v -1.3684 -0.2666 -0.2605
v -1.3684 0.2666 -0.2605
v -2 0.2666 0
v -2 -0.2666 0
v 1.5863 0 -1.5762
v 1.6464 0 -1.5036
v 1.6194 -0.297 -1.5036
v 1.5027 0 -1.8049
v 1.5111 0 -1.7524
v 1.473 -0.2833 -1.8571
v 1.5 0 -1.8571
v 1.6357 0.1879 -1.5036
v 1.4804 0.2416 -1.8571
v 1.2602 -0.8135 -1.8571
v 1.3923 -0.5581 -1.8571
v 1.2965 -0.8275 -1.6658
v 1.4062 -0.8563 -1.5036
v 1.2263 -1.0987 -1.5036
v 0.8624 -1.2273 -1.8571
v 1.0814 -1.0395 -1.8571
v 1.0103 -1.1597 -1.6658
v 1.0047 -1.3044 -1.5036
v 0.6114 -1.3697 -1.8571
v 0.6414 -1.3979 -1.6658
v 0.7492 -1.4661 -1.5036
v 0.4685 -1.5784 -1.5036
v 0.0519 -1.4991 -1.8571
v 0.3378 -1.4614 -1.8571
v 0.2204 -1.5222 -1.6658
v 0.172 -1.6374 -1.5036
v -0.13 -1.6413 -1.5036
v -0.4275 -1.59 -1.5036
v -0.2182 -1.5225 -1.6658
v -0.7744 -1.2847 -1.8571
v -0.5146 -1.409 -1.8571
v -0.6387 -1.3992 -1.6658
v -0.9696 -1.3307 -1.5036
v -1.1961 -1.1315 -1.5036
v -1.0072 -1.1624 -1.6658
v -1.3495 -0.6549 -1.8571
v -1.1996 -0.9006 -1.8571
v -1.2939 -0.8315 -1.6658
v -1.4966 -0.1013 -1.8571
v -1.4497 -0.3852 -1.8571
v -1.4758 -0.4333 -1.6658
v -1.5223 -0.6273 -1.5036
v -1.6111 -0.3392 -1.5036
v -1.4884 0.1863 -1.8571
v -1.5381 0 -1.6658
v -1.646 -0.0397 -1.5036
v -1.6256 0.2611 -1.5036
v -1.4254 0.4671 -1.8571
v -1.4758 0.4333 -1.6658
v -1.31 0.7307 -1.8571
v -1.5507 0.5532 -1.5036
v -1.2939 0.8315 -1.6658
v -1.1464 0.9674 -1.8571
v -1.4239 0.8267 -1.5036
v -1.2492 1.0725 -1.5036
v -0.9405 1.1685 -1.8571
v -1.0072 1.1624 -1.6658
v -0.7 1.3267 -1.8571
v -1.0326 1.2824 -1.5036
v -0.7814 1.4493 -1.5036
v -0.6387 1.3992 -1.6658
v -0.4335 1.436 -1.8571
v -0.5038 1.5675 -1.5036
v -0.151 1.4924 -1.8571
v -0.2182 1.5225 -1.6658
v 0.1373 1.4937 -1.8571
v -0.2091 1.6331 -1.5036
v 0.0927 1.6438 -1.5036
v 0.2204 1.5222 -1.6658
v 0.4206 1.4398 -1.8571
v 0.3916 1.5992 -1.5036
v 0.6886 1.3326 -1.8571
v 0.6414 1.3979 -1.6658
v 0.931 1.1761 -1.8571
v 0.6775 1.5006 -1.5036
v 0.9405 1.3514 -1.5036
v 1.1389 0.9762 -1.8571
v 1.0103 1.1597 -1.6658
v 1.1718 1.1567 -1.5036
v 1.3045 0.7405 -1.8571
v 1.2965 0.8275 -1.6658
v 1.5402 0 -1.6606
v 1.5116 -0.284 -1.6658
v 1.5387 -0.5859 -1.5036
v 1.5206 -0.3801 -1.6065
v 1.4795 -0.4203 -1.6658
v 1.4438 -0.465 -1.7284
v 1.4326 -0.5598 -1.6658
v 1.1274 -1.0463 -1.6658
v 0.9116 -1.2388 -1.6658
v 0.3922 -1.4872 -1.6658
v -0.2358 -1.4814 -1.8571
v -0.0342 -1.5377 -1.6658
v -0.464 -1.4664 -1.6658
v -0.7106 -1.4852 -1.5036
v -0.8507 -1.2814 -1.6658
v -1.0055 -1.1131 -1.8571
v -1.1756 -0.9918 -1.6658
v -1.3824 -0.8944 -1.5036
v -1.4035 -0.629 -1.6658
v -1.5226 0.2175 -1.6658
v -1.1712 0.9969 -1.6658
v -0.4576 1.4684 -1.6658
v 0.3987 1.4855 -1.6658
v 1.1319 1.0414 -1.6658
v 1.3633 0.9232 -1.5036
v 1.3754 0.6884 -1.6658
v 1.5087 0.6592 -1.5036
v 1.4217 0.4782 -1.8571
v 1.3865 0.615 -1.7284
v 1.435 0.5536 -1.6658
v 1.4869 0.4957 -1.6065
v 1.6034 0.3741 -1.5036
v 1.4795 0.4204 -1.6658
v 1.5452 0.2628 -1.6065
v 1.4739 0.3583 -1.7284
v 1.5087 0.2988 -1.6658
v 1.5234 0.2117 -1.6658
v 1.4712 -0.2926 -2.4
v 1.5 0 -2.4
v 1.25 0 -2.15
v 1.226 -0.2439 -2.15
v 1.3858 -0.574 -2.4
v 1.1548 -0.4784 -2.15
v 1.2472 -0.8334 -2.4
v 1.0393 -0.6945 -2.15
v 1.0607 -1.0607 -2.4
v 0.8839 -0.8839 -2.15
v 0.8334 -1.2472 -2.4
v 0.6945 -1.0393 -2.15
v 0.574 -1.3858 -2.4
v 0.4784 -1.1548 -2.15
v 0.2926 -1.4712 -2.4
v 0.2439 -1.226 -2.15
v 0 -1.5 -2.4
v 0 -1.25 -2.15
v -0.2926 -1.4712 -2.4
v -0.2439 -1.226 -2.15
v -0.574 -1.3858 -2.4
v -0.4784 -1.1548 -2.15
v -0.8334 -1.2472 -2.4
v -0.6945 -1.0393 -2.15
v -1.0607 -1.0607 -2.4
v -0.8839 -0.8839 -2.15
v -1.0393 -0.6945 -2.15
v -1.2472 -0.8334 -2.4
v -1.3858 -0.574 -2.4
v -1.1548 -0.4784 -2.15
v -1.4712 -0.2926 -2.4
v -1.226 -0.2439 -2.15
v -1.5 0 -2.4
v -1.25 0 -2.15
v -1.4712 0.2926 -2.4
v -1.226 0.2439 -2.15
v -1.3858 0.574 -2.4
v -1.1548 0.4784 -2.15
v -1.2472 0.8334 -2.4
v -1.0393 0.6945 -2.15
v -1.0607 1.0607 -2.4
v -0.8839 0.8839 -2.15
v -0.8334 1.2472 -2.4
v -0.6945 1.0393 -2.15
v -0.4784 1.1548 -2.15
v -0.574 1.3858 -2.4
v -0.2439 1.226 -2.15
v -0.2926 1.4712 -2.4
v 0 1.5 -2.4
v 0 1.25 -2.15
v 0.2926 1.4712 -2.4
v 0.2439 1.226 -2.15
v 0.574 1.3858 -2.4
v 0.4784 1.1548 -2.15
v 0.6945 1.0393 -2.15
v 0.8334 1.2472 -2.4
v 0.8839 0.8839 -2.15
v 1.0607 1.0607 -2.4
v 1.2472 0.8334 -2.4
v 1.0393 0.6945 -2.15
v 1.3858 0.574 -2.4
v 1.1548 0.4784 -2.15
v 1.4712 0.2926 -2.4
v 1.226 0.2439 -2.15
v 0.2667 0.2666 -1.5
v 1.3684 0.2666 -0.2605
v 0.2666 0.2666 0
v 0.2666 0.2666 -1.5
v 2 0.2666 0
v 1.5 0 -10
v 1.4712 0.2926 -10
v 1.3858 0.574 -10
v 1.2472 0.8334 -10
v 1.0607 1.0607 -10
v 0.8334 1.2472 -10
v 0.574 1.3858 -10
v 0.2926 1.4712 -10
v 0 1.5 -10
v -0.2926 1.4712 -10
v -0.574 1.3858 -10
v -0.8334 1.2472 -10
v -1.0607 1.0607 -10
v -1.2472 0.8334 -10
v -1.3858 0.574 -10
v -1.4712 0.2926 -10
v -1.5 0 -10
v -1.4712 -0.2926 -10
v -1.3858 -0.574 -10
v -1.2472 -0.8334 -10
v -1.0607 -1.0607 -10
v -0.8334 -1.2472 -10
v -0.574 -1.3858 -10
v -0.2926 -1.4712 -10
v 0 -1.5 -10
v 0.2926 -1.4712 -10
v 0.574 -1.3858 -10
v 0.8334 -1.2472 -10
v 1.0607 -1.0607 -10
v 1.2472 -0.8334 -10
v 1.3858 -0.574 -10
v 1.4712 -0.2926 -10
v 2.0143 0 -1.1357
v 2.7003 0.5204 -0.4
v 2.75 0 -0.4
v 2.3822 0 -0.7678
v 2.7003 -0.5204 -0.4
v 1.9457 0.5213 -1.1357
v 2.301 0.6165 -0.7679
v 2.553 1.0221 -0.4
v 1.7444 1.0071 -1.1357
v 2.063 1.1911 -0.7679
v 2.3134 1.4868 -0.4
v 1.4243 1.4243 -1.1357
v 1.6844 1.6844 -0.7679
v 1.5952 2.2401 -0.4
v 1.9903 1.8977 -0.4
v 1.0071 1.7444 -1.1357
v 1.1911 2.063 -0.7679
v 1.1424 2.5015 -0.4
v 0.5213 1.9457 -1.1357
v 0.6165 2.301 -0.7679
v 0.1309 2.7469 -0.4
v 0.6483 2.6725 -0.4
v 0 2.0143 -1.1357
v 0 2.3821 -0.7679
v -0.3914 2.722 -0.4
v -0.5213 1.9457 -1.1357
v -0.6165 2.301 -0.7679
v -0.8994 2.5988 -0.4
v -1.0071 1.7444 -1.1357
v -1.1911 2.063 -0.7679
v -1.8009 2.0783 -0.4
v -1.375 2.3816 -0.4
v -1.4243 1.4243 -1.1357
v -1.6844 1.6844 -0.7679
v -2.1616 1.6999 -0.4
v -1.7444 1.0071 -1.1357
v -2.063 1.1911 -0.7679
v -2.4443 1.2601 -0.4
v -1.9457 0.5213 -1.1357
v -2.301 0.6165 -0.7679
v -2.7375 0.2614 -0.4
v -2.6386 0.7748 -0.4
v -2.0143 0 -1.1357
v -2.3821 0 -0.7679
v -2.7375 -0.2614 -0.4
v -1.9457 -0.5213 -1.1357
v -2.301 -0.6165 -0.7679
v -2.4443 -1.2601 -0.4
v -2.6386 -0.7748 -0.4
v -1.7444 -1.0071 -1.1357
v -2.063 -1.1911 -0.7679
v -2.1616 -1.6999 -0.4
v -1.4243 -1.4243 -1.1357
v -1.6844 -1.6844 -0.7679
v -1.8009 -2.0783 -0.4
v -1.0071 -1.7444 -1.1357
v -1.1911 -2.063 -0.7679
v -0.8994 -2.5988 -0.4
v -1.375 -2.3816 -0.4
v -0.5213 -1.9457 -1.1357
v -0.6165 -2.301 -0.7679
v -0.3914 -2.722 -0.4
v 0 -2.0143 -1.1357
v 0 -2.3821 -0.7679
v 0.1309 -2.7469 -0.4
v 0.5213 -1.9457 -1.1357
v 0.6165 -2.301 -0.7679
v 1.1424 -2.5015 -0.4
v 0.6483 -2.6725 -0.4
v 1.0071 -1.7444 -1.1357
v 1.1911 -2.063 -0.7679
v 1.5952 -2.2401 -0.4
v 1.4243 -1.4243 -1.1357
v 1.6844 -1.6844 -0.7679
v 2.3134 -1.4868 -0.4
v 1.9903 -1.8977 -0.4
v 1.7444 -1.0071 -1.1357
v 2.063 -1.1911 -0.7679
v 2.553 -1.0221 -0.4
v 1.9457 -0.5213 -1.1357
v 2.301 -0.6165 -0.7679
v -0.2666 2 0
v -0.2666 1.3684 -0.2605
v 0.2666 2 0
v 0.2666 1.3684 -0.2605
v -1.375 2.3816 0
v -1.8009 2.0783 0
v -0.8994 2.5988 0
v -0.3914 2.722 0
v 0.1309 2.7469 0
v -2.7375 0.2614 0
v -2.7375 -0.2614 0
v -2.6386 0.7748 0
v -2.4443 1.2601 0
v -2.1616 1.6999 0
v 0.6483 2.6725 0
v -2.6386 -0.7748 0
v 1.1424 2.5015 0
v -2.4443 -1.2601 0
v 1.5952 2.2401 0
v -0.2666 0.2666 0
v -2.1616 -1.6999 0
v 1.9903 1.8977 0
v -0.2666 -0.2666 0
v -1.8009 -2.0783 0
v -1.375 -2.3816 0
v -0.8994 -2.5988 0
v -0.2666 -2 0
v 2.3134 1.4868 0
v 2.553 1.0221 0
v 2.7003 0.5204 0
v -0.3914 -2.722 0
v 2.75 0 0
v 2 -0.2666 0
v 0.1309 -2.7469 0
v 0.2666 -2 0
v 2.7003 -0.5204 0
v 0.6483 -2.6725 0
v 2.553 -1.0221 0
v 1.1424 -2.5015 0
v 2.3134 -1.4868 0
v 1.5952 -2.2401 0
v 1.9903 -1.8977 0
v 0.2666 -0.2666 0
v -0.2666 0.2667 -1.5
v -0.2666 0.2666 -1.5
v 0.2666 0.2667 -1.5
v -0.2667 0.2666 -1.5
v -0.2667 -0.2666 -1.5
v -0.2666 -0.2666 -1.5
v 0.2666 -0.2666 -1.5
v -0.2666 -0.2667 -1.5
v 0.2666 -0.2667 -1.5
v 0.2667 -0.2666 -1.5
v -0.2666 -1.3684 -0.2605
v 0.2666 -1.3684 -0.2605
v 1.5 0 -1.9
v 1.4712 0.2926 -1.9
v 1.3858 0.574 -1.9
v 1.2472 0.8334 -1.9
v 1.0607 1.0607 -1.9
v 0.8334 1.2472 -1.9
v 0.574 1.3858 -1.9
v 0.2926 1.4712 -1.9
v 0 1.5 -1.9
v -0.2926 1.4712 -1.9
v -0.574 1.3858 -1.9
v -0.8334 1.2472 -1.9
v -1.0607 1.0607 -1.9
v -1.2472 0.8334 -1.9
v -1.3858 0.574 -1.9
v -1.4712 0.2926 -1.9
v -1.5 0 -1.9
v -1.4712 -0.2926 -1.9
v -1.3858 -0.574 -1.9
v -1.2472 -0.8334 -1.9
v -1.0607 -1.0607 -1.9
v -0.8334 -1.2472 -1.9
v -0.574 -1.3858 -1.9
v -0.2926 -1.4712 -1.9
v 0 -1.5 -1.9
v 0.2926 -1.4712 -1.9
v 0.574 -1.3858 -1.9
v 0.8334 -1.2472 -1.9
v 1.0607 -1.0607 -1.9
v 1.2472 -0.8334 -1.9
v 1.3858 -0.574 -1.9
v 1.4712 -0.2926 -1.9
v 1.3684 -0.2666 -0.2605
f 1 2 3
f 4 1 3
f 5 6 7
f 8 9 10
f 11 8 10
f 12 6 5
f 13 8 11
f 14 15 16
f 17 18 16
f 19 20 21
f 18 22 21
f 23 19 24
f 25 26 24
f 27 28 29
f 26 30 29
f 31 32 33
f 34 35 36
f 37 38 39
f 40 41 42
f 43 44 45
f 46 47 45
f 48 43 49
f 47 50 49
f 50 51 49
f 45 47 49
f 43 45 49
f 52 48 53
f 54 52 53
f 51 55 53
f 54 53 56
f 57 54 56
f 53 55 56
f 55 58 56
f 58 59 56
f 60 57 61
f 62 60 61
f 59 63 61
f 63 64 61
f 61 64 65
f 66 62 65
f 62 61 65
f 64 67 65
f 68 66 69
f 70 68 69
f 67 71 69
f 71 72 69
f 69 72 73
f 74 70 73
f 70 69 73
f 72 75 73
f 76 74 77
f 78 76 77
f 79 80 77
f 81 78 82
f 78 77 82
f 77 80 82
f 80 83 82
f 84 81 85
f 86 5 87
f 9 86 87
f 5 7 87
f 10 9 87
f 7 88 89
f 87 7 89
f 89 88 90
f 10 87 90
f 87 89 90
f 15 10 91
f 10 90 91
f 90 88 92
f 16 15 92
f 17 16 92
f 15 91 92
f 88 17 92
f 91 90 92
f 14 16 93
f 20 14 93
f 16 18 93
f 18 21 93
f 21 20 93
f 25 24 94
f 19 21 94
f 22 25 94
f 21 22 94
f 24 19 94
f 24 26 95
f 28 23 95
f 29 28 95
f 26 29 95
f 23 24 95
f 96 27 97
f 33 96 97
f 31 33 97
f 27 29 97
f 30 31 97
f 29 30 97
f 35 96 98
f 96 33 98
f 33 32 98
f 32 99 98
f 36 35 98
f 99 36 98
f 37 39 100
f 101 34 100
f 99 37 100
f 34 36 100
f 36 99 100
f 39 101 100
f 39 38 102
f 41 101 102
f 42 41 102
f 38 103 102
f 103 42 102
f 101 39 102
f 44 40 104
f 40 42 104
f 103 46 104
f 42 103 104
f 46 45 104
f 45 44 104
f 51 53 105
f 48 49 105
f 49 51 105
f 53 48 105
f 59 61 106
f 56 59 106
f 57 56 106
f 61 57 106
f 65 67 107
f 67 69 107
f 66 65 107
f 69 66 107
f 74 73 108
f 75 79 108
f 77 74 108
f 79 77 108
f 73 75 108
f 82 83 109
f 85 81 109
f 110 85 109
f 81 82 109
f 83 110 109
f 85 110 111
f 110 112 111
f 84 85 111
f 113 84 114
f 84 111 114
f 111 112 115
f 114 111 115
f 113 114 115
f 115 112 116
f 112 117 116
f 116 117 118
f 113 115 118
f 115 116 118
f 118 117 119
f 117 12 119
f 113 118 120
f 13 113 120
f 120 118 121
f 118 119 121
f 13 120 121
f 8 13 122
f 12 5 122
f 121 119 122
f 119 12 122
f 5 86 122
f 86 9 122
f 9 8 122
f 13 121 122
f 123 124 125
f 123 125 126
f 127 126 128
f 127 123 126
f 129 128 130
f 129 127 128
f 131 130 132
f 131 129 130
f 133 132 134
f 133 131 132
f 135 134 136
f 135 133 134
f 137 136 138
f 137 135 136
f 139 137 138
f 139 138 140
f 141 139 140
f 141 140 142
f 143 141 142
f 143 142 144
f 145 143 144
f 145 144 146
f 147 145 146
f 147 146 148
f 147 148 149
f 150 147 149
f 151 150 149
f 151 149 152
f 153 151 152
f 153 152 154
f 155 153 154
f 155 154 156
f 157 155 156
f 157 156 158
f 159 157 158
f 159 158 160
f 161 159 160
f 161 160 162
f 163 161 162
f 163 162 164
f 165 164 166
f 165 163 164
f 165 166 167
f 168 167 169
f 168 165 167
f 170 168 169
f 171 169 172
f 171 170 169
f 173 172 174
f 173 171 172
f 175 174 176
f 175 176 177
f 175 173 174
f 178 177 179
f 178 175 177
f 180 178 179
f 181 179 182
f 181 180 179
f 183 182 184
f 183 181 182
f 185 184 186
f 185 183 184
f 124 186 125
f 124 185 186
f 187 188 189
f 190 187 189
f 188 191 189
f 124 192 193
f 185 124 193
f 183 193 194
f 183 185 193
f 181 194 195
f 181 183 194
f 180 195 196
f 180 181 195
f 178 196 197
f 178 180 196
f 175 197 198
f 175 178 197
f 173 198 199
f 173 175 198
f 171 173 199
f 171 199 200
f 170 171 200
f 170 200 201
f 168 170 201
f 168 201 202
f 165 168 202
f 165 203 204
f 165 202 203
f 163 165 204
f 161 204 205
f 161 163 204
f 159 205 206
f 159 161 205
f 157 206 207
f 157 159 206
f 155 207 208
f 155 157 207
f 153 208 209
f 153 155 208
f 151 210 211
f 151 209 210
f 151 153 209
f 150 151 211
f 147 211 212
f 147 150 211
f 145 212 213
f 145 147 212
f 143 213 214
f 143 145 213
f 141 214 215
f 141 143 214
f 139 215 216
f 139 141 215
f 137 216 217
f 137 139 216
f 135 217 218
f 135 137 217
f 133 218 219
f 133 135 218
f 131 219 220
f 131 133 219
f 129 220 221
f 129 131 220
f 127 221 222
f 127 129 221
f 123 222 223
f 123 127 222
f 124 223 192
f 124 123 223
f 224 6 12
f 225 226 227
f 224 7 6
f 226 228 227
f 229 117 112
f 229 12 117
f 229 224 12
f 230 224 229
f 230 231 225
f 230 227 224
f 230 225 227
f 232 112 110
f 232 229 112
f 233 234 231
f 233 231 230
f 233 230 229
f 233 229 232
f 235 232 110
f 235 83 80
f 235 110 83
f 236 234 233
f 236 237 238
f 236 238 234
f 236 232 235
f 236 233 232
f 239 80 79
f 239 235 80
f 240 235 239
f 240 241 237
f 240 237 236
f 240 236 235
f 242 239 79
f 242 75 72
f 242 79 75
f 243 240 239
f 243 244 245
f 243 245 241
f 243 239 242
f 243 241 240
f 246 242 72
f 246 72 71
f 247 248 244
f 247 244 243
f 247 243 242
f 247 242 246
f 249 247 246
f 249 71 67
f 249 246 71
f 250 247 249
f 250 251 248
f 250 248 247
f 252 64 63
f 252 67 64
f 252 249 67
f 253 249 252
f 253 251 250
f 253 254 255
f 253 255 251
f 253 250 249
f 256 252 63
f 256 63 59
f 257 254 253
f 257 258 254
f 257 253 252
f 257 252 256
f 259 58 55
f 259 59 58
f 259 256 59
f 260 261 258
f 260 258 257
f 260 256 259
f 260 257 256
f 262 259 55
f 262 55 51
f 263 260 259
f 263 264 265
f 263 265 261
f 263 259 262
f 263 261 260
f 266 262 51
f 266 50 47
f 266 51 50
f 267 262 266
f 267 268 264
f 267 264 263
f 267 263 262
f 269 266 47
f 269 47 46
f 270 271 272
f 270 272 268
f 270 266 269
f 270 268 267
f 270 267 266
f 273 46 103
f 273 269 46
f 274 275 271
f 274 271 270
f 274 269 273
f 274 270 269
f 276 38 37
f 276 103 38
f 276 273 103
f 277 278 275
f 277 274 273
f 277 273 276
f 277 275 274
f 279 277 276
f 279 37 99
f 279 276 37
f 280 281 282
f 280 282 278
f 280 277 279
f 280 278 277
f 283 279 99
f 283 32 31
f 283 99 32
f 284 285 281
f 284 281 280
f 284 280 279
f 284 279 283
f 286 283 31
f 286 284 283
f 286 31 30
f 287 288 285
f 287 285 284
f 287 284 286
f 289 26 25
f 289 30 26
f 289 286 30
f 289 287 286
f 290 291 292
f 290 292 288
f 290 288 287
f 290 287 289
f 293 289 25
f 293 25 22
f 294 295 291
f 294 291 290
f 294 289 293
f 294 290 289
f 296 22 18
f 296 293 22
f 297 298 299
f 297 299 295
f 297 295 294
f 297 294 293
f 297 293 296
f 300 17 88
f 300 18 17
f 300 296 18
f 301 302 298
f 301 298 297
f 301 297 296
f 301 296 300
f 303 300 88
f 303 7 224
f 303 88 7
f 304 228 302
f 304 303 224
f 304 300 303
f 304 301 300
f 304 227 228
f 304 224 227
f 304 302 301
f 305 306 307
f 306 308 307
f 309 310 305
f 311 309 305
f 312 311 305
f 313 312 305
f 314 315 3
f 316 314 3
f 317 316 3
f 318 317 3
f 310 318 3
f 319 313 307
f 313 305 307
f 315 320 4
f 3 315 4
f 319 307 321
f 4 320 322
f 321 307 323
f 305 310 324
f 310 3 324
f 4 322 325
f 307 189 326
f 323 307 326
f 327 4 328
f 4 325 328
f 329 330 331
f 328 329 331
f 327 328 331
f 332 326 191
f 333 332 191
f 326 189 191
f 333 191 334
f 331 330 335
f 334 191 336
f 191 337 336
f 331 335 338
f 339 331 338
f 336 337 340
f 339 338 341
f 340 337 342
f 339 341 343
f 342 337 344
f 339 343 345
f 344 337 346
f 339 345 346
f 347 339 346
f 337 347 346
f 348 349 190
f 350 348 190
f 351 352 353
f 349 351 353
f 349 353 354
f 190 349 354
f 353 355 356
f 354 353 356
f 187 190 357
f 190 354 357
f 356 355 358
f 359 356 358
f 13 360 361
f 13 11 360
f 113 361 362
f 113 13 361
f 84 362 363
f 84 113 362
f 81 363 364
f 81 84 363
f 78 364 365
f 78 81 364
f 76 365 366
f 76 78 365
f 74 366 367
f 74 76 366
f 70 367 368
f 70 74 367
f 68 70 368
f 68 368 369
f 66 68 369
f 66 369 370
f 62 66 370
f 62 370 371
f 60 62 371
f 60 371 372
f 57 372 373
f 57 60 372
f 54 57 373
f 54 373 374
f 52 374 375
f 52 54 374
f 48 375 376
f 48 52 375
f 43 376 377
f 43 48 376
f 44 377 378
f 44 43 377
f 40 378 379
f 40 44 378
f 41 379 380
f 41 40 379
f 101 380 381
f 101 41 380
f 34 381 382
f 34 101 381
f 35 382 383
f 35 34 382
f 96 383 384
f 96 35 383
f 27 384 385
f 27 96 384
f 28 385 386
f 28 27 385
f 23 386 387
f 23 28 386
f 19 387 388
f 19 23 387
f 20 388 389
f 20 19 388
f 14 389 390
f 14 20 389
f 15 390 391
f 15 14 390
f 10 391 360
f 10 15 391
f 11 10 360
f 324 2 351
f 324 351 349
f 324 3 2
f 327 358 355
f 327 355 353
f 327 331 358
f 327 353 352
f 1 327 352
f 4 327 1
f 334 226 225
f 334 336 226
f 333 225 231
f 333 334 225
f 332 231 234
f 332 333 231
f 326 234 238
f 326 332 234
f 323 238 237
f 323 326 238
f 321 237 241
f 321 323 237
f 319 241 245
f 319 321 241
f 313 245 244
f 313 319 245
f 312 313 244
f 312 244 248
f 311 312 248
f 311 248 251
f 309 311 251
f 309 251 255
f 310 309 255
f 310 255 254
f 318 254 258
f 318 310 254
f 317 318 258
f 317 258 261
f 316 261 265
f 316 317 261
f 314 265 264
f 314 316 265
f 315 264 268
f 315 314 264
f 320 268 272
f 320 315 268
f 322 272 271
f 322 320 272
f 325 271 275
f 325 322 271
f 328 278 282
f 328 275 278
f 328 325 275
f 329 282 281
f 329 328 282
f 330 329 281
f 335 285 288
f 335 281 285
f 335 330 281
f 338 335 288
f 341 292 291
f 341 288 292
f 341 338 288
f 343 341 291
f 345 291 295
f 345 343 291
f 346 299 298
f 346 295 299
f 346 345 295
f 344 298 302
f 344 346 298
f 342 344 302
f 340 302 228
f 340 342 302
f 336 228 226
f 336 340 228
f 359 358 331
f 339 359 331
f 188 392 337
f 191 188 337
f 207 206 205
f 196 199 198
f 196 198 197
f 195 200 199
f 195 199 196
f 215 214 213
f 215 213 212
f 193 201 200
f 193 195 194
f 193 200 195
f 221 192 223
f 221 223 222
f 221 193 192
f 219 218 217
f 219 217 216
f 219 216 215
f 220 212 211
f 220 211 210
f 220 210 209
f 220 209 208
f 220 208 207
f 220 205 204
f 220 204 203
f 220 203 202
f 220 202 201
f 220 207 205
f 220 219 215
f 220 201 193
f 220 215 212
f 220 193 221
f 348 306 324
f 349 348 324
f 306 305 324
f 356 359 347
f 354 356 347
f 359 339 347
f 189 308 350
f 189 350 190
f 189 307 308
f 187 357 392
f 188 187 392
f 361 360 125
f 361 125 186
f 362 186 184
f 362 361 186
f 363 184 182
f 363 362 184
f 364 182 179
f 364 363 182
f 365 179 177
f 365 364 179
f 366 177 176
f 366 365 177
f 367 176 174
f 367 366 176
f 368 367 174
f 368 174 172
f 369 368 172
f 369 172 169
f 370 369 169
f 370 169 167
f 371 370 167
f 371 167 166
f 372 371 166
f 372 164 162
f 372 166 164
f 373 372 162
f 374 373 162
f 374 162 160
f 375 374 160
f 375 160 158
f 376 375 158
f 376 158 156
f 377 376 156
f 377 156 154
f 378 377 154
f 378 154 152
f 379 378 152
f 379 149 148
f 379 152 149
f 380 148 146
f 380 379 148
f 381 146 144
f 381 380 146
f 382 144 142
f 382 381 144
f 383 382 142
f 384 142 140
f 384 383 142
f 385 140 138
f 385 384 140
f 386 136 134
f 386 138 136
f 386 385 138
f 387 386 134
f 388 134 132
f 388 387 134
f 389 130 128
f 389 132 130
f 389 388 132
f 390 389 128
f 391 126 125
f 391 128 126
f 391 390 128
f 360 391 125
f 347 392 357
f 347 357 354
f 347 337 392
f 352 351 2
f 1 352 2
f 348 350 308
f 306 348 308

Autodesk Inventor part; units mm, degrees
ref_plane "YZ Plane" through (0, 0, 0) normal (1, 0, 0) x (0, 1, 0)
sketch "Esquisse1" plane through (0, 0, 0) normal (0, 1, 0) x (-1, 0, 0)
  point P0 (0, 0)
sketch "Esquisse2" plane through (0, 0, 0) normal (0, 0, 1) x (1, 0, 0)
  point P0 (0, 0)
sketch "Esquisse3" plane through (0, 0, 0) normal (0, 0, 1) x (1, 0, 0)
  point P0 (0, 0)
sketch "Esquisse4" plane through (0, 0, 0) normal (0, 1, 0) x (-1, 0, 0)
  line L0 (-2.75, 0) -> (0, 0)
  line L1 (-2.75, -0.4) -> (-2.75, 0)
  line L2 (-1.5, -1.65) -> (-2.75, -0.4)
  line L3 (-1.5, -1.9) -> (-1.5, -1.65)
  line L4 (-1.25, -2.15) -> (-1.5, -1.9)
  line L5 (-1.5, -2.4) -> (-1.25, -2.15)
  line L6 (-1.5, -10) -> (-1.5, -2.4)
  line L7 (0, 0) -> (0, -10)
  line L8 (0, 3.3392) -> (0, -10.7) construction
  line L9 (0, 3.3392) -> (0, -10.7)
  line L10 (0, -13.5078) -> (0, 6.1471) projected
  line L11 (-1.5, -10) -> (0, -10)
  line L12 (0.55, 0) -> (-3.3, 0) projected
  dimension "d3" = 2.75
  dimension "d5" = 0.25
  dimension "d7" = 0.25
  dimension "d9" = 0.25
  dimension "d11" = 1.65
  dimension "d13" = 135
  dimension "d17" = 1.25
  dimension "d19" = 0
  dimension "d51" = 1.5
  dimension "d52" = 10
revolve "Révolution1" add sketch "Esquisse4" angle 360 about axis through (0, 0, 3.3392) along (0, 0, -1)
sketch "Esquisse5" plane through (0, 0, 0) normal (0, 1, 0) x (-1, 0, 0)
  line L0 (-1.6, 0) -> (0, 0)
  line L1 (-0.2667, -1.5) -> (-1.6, 0)
  line L2 (0, -1.5) -> (-0.2667, -1.5)
  line L3 (0, 0) -> (0, -1.5)
  line L4 (-1.5, -1.65) -> (1.5, -1.65) construction
  line L5 (-2.75, 0) -> (2.75, 0) projected
  line L6 (0, -1.98) -> (0, 0.33) projected
  dimension "d22" = 1.6
  dimension "d24" = 0.2667
  dimension "d26" = 1.5
extrude "Extrusion1" cut sketch "Esquisse5" along normal mid plane 0.5333
pattern_circular "RéseauPolaire1" count 4 over 360 about axis through (0, 0, 0) along (0, 0, 1) of "Extrusion1"
sketch "Esquisse7" plane through (0, 0, 0) normal (0, 1, 0) x (-1, 0, 0)
  line L0 (0, -0.825) -> (-2, 0)
  line L1 (0, 0) -> (0, -0.825)
  line L2 (-2, 0) -> (0, 0)
  line L3 (-1.5, -1.65) -> (1.5, -1.65) construction
  line L4 (0, -1.98) -> (0, 0.33) projected
  line L5 (-2.75, 0) -> (2.75, 0) projected
  dimension "d33" = 2
  dimension "d35" = 0.825
extrude "Extrusion2" cut sketch "Esquisse7" along normal mid plane 0.5333
pattern_circular "RéseauPolaire2" count 4 over 360 about axis through (0, 0, 0) along (0, 0, 1) of "Extrusion2"
fillet "Congé1" radius 0.5 1 edges at (-1.5, 0, -1.65)
thread "Filetage1" size "M3x0.5" class "6g" standard "ISO Metric profile" full length
ref_plane "MSC_PF1" through (0, 0, 0) normal (1, 0, 0) x (0, 1, 0)
ref_plane "MSC_PT1" through (0, 0, 0) normal (0, 0, -1) x (-1, 0, 0)
equation "\"d3\" = 0.5 * Dh"
equation "\"d5\" = msp_x"
equation "\"d7\" = ParA"
equation "\"d9\" = msp_x"
equation "\"d11\" = ParK"
equation "\"d17\" = 0.5 * msp_mdtds"
equation "\"d51\" = 0.5 * NND"
equation "\"d52\" = NLG"
equation "\"d22\" = 0.5 * M"
equation "\"d24\" = 0.0833333 * M"
equation "\"d26\" = 0.909091 * ParK"
equation "\"d27\" = 0.166667 * M"
equation "\"d33\" = 0.625 * M"
equation "\"d35\" = 0.5 * ParK"
equation "\"d36\" = 0.166667 * M"
equation "\"d41\" = 2 * msp_x"
equation "\"PTC\" = 0.5"
equation "\"NLG\" = 10"
equation "\"ParK\" = 1.65"
equation "\"NND\" = 3"
equation "\"M\" = 3.2"
equation "\"msp_mdtds\" = NND - PTC"
equation "\"Dh\" = 5.5"
equation "\"msp_x\" = 0.5 * PTC"
equation "\"ParA\" = 0.5 * PTC"
equation "\"r\" = 0.8"
equation "\"THREADDIA\" = NND"
equation "\"TEMPLATE\" = 1.2345"
properties part number "NF EN ISO 7046-2 H - M3x10 - 8.8 - H1" material "Acier inoxydable 440C"
